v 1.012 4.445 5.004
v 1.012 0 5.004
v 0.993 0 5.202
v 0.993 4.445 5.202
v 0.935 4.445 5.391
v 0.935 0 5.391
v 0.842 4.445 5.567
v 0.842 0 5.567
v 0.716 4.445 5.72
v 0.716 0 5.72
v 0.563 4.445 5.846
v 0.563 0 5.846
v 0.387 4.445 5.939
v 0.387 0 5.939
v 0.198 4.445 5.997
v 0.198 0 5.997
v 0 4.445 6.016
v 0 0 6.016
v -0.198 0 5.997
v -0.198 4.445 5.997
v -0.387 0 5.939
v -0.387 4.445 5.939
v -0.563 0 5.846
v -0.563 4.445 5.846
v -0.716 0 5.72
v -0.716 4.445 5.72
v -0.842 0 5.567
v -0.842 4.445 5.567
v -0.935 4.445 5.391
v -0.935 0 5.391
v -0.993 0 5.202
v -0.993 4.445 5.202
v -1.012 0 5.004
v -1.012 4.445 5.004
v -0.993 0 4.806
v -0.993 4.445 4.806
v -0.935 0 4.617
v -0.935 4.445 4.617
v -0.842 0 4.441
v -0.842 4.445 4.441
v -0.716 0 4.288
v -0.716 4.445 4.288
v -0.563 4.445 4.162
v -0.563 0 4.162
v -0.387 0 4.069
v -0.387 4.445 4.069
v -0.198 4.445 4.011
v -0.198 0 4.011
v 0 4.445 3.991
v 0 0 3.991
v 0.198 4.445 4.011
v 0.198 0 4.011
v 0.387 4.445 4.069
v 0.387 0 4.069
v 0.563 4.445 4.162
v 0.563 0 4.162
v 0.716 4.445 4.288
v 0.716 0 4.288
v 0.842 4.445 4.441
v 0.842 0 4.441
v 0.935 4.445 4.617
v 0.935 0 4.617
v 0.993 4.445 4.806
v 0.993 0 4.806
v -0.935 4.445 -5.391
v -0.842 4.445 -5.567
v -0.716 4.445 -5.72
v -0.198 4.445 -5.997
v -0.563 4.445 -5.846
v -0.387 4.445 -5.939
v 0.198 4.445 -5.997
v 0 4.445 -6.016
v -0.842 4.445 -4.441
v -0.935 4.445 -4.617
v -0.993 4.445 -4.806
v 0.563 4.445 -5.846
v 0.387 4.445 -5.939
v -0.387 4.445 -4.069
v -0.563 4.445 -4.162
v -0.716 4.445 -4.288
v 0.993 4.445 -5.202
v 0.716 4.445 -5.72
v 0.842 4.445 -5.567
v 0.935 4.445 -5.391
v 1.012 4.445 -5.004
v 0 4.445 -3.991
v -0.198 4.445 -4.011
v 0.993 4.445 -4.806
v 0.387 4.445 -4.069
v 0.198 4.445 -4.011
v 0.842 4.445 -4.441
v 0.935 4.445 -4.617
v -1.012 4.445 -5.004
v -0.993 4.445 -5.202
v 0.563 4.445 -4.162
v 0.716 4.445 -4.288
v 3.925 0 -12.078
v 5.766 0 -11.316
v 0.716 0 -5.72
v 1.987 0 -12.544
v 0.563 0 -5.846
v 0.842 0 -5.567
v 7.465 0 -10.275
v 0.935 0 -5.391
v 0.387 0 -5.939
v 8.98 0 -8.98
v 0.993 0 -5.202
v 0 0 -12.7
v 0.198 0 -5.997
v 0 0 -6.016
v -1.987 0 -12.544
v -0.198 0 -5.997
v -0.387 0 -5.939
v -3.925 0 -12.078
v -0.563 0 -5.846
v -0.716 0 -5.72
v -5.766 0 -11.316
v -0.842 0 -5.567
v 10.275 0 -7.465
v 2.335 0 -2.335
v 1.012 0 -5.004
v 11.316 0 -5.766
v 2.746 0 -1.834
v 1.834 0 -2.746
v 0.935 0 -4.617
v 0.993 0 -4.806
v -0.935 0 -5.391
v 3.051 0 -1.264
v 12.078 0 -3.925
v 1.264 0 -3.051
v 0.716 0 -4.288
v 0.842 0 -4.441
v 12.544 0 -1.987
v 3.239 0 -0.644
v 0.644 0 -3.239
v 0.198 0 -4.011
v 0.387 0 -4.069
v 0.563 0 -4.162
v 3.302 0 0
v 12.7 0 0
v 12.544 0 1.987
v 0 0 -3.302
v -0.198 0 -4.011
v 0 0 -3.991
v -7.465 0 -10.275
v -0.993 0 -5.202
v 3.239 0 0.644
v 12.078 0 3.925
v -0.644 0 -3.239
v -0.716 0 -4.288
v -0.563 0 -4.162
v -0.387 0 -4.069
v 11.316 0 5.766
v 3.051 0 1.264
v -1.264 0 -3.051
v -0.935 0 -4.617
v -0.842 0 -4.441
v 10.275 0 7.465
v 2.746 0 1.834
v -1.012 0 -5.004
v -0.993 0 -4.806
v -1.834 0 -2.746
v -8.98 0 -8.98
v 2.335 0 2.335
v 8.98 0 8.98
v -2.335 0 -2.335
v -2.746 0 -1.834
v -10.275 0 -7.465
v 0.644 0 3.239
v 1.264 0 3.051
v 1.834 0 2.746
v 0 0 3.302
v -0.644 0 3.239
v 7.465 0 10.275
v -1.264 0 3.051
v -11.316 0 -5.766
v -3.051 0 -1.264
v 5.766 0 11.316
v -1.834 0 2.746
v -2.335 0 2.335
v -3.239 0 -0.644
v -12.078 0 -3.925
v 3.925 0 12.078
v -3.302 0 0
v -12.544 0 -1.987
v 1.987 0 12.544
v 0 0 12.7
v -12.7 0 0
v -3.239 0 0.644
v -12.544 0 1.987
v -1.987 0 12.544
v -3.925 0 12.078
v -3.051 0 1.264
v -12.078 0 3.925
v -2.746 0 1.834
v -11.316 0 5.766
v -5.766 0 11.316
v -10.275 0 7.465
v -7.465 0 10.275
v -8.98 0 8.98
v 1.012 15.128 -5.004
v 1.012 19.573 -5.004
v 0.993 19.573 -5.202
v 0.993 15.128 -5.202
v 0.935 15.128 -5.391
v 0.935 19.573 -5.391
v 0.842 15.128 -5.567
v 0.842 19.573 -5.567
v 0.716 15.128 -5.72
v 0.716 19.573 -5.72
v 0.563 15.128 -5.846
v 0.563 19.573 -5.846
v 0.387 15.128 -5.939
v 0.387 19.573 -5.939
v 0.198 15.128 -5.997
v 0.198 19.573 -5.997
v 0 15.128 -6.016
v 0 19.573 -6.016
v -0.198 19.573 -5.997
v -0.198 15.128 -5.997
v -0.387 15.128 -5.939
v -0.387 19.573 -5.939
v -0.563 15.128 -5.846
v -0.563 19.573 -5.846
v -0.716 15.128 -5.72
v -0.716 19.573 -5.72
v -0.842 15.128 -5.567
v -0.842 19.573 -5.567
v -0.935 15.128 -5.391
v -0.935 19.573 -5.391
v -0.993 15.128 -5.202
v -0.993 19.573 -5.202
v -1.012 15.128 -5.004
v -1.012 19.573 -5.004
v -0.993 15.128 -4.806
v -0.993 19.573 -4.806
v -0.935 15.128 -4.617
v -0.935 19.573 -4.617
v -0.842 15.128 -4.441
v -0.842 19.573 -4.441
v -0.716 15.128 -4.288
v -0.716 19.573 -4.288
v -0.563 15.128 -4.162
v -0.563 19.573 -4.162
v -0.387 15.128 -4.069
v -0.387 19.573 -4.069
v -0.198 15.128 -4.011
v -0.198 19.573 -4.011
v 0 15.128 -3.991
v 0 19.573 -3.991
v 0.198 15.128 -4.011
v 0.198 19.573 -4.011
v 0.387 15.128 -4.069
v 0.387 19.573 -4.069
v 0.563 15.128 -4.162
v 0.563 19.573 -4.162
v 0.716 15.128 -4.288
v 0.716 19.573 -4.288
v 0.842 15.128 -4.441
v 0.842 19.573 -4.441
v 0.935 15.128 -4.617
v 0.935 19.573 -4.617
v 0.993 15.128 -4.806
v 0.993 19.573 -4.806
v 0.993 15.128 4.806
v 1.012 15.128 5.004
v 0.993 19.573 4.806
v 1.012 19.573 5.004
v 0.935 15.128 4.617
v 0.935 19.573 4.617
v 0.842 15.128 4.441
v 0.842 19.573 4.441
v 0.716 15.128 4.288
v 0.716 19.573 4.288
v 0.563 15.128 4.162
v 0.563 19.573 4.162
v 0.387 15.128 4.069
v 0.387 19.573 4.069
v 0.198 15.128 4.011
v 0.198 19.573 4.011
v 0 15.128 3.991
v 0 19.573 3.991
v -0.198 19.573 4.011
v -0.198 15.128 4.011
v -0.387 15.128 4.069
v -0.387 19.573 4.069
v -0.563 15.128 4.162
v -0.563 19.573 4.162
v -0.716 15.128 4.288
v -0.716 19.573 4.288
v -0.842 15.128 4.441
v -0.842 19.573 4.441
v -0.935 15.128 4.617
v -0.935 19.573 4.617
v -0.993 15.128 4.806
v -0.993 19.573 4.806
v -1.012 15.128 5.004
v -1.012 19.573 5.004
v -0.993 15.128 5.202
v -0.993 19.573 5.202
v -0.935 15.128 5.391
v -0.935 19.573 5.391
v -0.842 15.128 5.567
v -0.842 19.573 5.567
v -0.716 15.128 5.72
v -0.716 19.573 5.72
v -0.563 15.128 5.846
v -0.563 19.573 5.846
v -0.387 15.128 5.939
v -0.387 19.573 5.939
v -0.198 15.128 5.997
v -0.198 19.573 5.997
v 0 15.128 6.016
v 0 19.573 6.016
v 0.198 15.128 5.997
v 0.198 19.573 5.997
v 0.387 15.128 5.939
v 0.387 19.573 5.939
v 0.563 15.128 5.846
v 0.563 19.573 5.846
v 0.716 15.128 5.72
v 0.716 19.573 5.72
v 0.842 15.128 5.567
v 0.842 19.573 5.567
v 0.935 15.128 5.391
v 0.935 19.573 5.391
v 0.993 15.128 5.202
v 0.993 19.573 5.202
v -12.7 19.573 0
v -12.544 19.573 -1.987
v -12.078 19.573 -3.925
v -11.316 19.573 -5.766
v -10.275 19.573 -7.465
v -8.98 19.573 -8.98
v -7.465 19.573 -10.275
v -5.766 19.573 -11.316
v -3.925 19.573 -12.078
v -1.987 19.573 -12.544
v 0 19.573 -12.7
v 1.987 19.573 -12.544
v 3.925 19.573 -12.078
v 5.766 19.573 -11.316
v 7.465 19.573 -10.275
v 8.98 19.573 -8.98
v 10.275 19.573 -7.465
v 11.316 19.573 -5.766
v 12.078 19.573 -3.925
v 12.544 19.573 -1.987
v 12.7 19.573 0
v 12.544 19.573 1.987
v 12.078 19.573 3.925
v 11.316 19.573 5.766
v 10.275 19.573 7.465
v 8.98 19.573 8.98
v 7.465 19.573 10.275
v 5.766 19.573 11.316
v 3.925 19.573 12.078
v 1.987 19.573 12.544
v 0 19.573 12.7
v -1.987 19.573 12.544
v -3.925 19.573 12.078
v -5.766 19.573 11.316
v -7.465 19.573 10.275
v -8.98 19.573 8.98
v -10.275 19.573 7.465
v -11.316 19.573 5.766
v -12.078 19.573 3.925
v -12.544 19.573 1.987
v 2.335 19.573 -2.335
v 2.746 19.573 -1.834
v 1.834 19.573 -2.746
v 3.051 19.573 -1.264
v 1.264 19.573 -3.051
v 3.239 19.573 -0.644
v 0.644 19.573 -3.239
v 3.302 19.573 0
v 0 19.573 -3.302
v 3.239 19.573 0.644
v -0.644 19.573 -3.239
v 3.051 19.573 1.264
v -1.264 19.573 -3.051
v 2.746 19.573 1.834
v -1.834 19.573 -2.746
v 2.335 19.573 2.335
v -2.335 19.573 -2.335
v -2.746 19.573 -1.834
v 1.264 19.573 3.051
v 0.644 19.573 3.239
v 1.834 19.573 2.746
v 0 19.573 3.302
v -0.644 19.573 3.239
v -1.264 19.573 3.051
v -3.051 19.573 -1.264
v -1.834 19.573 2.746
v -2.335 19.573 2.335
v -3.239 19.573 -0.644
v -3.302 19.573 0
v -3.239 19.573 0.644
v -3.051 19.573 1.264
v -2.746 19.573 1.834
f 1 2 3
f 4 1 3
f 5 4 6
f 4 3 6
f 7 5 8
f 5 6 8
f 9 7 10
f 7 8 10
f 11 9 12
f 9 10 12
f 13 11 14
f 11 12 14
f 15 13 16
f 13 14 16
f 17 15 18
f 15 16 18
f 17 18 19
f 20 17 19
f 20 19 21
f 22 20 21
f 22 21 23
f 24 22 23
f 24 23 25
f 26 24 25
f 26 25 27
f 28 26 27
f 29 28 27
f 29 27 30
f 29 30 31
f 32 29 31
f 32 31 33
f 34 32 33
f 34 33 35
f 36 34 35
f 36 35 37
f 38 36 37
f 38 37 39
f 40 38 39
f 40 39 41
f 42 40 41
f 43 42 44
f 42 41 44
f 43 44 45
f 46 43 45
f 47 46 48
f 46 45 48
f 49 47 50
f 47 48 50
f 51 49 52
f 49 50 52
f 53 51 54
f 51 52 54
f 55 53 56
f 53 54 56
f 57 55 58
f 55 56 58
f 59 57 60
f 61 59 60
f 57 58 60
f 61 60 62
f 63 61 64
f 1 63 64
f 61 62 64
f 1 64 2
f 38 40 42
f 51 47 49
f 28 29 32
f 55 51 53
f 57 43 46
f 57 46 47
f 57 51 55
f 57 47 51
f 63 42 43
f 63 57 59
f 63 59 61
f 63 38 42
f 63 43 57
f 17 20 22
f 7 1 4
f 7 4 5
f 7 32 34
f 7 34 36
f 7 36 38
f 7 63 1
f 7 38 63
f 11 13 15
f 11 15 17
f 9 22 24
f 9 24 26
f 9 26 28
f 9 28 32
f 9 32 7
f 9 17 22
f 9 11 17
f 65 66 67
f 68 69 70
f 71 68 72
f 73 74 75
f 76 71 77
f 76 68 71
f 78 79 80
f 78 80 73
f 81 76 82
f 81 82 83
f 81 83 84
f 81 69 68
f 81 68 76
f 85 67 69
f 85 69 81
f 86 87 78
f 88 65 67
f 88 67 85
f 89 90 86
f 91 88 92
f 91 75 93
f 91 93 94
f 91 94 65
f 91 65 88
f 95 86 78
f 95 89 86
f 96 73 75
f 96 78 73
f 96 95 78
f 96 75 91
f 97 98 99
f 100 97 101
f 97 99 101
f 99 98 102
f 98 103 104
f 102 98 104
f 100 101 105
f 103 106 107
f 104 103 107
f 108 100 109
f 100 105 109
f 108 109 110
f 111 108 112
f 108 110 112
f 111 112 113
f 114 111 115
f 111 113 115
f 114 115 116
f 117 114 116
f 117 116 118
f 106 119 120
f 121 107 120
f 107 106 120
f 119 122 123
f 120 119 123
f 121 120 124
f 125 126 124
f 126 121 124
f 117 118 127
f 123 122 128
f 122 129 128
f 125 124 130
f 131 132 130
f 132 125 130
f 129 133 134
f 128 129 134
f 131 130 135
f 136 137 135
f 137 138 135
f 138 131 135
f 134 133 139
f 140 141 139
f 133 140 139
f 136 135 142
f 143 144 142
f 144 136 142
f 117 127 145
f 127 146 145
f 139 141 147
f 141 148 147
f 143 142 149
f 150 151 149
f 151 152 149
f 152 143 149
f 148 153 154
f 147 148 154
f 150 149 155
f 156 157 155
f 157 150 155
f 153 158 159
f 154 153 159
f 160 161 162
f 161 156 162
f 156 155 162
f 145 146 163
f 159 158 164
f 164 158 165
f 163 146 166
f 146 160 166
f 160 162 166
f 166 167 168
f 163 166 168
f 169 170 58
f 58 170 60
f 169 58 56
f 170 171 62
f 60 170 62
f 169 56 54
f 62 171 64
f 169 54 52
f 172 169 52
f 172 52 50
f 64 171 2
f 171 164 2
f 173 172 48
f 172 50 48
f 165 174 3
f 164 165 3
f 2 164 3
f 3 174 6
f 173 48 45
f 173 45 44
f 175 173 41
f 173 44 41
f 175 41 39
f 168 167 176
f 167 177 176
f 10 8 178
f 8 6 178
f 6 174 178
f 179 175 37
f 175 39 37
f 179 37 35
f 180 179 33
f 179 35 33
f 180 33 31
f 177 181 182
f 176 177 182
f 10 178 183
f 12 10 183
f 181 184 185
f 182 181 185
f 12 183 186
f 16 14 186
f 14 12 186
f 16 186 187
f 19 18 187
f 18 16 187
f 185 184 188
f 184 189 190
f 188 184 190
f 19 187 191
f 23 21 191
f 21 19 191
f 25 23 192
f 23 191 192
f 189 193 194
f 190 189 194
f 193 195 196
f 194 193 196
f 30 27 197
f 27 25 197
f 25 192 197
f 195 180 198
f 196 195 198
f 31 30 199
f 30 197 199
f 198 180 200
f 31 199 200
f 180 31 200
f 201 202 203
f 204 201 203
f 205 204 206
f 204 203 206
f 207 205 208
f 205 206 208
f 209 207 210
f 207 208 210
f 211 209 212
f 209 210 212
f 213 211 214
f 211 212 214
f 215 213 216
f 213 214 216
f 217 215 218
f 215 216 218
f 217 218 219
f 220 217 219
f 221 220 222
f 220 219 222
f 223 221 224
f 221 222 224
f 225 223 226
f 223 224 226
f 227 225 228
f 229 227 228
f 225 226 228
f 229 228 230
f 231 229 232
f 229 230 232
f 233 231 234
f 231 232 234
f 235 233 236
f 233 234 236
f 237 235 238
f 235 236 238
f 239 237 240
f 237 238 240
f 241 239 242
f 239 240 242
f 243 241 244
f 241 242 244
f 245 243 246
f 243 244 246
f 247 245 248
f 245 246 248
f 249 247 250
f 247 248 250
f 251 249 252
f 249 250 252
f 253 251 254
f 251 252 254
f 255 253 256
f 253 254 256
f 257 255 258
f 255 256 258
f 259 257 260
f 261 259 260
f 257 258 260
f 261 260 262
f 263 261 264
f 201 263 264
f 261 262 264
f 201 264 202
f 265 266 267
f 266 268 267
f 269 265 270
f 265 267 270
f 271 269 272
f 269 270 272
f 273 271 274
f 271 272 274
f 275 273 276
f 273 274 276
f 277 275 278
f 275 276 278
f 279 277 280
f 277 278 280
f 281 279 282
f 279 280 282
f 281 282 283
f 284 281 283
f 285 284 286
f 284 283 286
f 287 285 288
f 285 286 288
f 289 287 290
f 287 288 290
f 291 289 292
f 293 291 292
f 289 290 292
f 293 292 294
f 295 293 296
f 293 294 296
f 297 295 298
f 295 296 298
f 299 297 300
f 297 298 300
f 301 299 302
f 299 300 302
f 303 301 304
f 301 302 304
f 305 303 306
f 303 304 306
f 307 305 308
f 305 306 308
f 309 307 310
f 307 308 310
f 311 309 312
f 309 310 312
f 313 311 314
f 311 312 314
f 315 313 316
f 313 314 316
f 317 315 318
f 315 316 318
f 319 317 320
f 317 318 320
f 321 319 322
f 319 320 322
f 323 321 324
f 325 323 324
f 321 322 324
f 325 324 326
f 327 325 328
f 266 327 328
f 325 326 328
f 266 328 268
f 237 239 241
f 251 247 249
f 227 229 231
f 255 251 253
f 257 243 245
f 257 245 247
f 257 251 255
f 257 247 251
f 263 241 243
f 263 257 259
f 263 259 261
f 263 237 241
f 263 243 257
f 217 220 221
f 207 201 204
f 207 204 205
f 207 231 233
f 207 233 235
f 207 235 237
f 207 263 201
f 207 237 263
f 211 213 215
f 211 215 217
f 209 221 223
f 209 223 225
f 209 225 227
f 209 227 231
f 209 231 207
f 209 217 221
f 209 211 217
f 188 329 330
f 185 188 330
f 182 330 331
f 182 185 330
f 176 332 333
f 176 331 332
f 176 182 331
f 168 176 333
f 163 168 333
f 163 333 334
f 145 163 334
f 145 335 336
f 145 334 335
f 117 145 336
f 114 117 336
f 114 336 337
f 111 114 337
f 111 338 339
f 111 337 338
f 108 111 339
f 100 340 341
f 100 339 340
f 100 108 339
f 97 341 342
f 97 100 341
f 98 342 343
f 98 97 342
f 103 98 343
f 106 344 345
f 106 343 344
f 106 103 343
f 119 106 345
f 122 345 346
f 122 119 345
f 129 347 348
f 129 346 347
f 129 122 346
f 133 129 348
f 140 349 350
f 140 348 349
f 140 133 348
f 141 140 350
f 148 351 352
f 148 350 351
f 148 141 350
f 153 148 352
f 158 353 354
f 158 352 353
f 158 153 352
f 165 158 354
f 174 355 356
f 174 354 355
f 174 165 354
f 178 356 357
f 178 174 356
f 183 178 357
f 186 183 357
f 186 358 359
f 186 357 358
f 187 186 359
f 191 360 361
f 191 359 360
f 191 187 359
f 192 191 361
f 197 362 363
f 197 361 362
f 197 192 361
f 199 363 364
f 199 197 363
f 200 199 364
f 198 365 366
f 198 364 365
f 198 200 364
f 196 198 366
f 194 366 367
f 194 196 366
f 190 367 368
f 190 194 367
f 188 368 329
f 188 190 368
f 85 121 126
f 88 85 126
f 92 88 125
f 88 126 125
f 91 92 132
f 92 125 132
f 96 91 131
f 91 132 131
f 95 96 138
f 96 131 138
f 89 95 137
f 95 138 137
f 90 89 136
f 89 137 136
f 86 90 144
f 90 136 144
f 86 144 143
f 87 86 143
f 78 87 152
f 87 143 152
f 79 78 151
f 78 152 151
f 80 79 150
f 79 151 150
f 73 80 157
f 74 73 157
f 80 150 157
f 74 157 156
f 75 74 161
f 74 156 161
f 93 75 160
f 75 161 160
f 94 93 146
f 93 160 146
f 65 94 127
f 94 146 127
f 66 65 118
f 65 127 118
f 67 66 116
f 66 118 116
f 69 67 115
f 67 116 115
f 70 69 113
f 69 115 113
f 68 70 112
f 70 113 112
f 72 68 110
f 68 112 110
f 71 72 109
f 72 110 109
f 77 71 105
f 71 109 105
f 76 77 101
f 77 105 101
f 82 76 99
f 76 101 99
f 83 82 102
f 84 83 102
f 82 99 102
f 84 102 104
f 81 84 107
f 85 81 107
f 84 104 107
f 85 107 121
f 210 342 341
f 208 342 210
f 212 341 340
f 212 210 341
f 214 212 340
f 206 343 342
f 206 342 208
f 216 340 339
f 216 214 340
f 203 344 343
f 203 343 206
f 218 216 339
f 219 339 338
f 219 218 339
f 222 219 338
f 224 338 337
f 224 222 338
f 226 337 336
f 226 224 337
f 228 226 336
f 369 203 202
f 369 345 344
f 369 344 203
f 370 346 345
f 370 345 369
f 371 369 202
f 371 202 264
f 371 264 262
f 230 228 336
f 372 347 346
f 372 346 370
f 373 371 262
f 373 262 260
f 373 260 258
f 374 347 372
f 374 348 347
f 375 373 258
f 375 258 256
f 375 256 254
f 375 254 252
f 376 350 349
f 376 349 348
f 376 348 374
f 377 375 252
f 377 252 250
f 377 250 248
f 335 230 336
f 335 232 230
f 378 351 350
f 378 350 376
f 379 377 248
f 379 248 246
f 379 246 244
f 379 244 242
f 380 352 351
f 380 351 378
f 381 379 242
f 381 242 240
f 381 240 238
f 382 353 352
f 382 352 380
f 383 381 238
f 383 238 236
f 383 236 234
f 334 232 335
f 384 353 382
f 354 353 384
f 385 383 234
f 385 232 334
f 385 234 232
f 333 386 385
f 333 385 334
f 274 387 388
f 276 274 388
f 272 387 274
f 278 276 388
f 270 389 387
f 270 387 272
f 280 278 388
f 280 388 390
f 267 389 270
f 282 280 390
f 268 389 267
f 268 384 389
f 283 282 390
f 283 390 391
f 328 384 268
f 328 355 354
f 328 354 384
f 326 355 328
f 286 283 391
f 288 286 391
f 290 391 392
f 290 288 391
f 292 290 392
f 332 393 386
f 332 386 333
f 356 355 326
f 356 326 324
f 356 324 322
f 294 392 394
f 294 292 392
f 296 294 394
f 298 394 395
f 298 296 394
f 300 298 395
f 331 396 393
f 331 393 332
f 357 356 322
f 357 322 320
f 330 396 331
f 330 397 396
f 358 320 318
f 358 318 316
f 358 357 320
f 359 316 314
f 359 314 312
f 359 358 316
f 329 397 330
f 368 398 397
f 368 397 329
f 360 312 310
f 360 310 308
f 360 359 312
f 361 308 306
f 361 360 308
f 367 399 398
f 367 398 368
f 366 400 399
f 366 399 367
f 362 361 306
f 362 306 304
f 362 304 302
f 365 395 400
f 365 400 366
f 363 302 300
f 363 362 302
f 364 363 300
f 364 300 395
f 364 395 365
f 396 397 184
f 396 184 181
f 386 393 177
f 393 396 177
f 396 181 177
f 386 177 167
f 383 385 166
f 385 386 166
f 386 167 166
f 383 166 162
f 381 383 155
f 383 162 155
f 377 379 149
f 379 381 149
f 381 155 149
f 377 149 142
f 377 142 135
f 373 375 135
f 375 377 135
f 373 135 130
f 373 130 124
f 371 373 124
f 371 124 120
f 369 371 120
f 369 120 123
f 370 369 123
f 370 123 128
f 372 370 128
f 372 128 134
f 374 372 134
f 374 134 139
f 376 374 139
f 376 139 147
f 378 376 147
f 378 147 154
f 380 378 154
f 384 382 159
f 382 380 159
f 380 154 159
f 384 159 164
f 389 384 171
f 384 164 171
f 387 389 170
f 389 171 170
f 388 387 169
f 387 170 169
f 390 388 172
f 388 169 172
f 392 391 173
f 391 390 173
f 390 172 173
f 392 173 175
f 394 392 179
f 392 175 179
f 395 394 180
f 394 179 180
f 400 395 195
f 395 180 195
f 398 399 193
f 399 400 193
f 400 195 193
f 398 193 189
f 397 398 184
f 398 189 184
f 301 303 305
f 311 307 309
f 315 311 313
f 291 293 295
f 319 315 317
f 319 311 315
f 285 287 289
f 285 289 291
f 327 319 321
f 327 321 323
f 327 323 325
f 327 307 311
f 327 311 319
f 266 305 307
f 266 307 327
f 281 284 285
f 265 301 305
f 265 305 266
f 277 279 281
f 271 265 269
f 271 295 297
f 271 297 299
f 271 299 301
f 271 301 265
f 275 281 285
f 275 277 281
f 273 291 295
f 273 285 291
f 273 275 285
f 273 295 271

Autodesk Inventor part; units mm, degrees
ref_plane "YZ Plane" through (0, 0, 0) normal (1, 0, 0) x (0, 1, 0)
ref_plane "XZ Plane" through (0, 0, 0) normal (0, 1, 0) x (-1, 0, 0)
ref_plane "XY Plane" through (0, 0, 0) normal (0, 0, 1) x (1, 0, 0)
sketch "Sketch1" plane through (0, 0, 0) normal (0, 1, 0) x (-1, 0, 0)
  circle A0 centre (0, 0) radius 12.7
  circle A1 centre (0, 0) radius 3.302
  dimension "d0" = 25.4
  dimension "d1" = 6.604
extrude "Extrusion1" add sketch "Sketch1" along normal blind 19.5732
sketch "Sketch2" plane through (0, 19.5732, 0) normal (0, 1, 0) x (1, 0, 0)
  line L0 (0, 0) -> (0, -5.004)
  line L1 (0, -5.004) -> (0, 0)
  line L2 (0, 0) -> (0, 5.004)
  circle A0 centre (0, -5.004) radius 1.0125
  circle A1 centre (0, 5.004) radius 1.0125
  dimension "d4" = 5.004
  dimension "d5" = 5.004
  dimension "d6" = 2.025
  dimension "d7" = 2.025
extrude "Extrusion2" cut sketch "Sketch2" against normal blind 4.445
sketch "Sketch3" plane through (0, 0, 0) normal (0, -1, 0) x (1, 0, 0)
  line L0 (0, 0) -> (0, 5.004)
  circle A0 centre (0, 5.004) radius 1.0125
  line L1 (0, 0) -> (0, -5.004)
  circle A1 centre (0, -5.004) radius 1.0125
  dimension "d10" = 5.004
  dimension "d15" = 2.025
  dimension "d16" = 5.004
  dimension "d17" = 2.025
extrude "Extrusion3" cut sketch "Sketch3" against normal blind 4.445
properties part number "PolarisPost_HeightAdjustment_0p77in_ForK1S4Mirrors_Machined"
